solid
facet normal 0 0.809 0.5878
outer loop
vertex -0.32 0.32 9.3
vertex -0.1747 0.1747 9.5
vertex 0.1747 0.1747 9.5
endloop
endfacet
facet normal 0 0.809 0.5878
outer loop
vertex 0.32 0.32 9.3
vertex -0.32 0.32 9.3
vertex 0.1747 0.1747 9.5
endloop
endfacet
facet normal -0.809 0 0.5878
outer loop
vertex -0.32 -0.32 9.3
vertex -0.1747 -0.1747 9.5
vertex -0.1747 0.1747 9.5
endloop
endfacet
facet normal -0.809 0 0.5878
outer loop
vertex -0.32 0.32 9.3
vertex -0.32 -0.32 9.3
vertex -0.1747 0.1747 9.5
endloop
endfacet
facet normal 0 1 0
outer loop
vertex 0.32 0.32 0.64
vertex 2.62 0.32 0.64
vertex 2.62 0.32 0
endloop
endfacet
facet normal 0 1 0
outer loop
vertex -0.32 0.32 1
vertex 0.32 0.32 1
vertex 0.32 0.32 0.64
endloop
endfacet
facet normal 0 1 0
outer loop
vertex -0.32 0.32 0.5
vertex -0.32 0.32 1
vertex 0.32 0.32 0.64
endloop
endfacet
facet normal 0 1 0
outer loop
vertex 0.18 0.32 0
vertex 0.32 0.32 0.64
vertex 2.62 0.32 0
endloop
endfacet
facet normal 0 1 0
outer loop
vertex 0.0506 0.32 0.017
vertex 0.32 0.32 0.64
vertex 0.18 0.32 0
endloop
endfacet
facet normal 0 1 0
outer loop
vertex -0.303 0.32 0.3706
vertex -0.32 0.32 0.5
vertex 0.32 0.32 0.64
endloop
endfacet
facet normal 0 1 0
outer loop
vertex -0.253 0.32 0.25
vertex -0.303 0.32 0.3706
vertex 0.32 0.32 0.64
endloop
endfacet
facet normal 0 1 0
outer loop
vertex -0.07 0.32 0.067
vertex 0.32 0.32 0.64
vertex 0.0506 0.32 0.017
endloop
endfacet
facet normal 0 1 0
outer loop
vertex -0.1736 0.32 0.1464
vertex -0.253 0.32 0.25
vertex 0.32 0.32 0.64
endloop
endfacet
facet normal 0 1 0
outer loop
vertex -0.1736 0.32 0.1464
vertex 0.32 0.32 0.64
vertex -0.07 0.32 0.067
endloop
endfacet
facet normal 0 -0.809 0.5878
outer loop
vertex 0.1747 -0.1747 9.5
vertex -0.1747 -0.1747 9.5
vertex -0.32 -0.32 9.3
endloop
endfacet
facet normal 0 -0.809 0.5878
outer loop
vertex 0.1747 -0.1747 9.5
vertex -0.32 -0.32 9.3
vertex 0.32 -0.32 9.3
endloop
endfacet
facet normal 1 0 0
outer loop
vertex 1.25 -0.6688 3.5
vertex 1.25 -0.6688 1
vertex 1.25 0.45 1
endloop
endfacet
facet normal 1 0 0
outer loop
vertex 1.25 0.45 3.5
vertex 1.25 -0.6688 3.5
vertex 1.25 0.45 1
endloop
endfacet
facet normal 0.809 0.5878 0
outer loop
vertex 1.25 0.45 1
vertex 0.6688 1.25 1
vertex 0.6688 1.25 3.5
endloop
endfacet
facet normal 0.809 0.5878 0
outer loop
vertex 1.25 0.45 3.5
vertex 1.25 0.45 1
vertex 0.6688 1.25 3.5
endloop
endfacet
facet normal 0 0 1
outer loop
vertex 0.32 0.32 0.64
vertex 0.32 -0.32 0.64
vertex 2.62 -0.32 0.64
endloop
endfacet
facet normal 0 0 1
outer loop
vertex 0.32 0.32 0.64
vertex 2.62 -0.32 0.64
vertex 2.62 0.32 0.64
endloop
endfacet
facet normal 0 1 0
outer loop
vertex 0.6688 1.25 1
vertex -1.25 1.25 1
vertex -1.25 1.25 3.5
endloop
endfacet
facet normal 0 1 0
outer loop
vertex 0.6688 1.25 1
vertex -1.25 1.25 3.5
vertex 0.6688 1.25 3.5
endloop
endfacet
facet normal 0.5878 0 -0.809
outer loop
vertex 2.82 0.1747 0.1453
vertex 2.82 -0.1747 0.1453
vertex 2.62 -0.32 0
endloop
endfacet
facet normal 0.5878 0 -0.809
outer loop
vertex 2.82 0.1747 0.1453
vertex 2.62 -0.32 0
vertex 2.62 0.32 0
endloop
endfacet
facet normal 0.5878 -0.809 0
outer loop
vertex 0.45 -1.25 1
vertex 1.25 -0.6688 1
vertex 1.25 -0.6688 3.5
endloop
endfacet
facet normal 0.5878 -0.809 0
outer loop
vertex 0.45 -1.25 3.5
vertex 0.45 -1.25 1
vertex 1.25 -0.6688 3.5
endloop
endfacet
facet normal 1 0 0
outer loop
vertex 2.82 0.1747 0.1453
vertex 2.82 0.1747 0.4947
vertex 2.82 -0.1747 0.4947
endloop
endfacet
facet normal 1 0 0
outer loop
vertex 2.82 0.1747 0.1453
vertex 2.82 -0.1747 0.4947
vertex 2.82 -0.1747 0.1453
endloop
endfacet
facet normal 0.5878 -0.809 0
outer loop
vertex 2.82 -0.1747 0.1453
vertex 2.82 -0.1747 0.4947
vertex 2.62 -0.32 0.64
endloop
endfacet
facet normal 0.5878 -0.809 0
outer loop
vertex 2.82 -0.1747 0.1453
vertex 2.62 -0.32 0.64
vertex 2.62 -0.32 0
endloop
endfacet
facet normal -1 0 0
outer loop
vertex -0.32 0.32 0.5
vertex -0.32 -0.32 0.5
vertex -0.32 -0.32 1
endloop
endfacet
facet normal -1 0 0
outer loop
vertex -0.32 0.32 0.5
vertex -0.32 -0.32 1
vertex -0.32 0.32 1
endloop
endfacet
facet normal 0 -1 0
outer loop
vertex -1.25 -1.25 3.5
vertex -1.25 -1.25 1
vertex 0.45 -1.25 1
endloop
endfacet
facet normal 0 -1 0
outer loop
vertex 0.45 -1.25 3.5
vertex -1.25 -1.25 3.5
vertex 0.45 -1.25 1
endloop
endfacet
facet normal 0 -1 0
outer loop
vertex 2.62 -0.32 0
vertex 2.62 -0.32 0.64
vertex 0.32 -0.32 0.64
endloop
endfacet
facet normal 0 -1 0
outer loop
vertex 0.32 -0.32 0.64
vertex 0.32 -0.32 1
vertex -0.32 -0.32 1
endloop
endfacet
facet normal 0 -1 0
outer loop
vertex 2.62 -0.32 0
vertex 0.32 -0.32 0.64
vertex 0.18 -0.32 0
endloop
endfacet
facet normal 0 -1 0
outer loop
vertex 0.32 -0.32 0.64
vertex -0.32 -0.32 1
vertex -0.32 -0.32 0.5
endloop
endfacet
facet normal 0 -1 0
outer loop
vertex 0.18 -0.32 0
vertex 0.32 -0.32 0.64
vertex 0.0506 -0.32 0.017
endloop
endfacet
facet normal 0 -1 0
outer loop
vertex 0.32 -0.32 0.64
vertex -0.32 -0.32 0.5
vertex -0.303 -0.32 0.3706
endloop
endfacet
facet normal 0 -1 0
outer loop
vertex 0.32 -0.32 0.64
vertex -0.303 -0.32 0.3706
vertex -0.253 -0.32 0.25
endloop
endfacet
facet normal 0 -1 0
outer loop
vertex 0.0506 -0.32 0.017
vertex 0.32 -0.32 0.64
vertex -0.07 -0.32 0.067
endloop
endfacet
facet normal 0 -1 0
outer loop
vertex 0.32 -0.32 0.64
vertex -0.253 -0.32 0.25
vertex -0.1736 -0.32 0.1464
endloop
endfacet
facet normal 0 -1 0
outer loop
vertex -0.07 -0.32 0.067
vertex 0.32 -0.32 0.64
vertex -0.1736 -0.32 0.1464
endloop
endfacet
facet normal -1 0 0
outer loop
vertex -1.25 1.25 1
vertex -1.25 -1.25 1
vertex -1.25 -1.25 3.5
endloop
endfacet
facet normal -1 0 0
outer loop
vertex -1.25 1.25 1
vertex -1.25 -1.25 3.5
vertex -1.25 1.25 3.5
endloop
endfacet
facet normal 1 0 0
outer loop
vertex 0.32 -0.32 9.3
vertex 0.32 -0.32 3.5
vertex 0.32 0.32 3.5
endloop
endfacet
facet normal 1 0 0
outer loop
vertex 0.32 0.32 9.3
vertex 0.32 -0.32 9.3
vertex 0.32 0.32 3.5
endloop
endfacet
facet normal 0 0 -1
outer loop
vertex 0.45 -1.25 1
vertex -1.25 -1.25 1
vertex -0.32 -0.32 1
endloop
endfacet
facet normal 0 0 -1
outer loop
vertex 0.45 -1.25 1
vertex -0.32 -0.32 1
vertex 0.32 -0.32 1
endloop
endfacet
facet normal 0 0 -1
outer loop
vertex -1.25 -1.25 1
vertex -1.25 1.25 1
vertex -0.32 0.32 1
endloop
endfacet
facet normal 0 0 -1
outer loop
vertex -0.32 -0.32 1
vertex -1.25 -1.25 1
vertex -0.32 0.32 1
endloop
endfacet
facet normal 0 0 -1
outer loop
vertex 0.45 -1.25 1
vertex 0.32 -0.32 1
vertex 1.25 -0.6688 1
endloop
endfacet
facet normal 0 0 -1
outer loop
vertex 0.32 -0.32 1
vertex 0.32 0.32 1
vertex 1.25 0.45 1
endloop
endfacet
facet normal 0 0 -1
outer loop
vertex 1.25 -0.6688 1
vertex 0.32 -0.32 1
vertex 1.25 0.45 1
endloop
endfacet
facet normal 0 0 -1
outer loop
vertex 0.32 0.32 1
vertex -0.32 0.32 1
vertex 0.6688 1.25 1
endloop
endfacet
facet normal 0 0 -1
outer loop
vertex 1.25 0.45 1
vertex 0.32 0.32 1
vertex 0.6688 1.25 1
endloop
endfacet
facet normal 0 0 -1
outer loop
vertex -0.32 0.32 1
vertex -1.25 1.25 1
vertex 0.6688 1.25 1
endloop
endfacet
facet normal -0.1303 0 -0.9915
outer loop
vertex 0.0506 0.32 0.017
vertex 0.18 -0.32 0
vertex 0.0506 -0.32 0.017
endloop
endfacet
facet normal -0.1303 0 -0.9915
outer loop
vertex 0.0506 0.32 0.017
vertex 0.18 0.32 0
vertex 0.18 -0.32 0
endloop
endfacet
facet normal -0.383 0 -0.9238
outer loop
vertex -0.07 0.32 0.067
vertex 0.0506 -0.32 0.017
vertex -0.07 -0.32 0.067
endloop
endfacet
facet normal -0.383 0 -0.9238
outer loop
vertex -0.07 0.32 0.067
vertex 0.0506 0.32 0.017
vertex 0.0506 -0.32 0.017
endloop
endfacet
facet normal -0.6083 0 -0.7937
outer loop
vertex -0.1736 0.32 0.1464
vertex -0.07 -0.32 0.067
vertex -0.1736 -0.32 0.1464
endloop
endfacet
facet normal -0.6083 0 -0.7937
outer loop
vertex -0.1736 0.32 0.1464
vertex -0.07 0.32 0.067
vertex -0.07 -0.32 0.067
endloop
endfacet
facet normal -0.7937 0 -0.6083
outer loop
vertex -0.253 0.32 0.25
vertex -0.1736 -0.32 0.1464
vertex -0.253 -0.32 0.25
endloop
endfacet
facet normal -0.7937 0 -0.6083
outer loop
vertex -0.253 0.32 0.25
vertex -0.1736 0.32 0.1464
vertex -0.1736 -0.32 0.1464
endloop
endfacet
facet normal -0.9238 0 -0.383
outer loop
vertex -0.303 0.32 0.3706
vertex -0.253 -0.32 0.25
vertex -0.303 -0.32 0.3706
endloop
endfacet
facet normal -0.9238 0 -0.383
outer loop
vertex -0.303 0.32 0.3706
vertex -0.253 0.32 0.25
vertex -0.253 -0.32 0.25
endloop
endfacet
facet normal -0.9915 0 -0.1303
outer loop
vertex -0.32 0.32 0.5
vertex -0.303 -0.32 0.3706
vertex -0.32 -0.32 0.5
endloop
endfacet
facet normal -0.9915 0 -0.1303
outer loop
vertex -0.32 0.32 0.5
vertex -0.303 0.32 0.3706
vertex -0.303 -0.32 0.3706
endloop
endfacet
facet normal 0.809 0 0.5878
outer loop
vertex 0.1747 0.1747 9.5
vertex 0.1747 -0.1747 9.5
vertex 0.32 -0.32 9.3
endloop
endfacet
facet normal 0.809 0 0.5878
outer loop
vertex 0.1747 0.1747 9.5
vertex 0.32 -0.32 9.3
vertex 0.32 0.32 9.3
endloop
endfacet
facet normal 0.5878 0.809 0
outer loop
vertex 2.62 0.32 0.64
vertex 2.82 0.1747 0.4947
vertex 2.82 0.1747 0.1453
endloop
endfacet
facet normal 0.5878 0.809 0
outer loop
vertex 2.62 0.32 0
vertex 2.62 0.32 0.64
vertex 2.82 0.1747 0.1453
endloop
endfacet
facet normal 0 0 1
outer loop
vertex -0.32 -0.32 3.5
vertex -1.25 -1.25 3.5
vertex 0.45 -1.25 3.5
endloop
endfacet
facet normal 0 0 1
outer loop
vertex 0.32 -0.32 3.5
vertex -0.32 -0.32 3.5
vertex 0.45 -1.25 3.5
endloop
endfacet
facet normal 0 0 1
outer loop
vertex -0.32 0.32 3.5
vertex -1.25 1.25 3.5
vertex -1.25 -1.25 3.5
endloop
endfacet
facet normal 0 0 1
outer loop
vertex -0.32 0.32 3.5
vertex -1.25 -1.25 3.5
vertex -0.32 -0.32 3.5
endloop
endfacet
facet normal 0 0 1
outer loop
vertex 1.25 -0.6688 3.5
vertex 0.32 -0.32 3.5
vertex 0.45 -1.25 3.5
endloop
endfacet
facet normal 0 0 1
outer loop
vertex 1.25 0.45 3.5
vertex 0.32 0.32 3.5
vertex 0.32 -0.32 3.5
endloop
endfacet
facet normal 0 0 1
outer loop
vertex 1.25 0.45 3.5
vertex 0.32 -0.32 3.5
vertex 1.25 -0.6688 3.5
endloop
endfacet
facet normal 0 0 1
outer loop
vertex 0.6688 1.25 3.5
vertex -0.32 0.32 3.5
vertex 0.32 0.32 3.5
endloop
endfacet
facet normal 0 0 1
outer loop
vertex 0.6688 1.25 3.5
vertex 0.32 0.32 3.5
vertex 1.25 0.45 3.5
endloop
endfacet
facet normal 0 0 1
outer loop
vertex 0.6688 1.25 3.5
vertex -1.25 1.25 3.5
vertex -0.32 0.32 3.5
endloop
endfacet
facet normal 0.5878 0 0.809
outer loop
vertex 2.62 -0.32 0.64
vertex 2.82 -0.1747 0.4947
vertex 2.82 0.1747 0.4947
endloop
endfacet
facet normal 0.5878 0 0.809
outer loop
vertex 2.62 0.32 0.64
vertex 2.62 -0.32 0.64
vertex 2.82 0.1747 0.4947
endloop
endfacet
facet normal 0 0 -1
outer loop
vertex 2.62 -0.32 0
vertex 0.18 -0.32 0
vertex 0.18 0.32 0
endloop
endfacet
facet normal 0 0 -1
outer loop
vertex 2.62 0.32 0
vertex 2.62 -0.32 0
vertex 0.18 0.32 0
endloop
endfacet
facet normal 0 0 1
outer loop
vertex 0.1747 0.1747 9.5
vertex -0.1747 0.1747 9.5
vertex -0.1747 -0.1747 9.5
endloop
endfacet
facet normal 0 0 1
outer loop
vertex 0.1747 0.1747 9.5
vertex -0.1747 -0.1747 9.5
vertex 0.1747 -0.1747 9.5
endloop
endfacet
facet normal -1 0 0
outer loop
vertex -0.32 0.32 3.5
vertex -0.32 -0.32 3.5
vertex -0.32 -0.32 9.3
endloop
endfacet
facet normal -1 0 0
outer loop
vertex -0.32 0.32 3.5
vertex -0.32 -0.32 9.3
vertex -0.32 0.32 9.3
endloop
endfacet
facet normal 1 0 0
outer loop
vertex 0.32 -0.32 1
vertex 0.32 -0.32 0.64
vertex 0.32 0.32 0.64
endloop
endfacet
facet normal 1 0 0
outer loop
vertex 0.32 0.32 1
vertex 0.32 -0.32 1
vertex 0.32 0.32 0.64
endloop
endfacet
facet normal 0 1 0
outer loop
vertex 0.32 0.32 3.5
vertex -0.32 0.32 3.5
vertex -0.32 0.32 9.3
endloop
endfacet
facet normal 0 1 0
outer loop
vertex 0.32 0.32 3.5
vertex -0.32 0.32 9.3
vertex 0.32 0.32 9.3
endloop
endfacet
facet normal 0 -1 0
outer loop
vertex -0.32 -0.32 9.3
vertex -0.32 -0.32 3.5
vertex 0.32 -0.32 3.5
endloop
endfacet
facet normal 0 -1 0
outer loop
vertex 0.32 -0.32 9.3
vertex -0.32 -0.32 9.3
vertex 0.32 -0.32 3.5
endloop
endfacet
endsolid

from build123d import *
from OCP.BRepFilletAPI import BRepFilletAPI_MakeChamfer

# Parameters (mm, degrees)
SKETCH_1_W           = 2.5
SKETCH_1_H           = 2.5
EXTRUDE_1_DEPTH      = 2.5
EXTRUDE_2_DEPTH      = 6
EXTRUDE_2_DEPTH_BACK = 3.5
SKETCH_2_W           = 0.64
SKETCH_2_H           = 0.64
SKETCH_4_W           = 0.64
SKETCH_4_H           = 0.64
EXTRUDE_4_DEPTH      = 2.5
FILLET_1_R           = 0.5
CHAMFER_1_SIZE       = 0.2
CHAMFER_1_SIZE2      = 0.145308506
CHAMFER_2_SIZE       = 0.8
CHAMFER_2_SIZE2      = 0.581234022


with BuildPart() as part:
    # Эскиз1 → Бобышка-Вытянуть1 (new body)
    with BuildSketch(Plane.XY.offset(1)):
        Rectangle(SKETCH_1_W, SKETCH_1_H)
    extrude(amount=EXTRUDE_1_DEPTH)

    # Эскиз2 → Бобышка-Вытянуть2 (add, two sides: drawn at the far end of the back side and taken through both)
    with BuildSketch(Plane.XY.offset(3.5).offset(-EXTRUDE_2_DEPTH_BACK)):
        Rectangle(SKETCH_2_W, SKETCH_2_H)
    extrude(amount=EXTRUDE_2_DEPTH + EXTRUDE_2_DEPTH_BACK)

    # Эскиз4 → Бобышка-Вытянуть4 (add)
    with BuildSketch(Plane(origin=(0.32, 0, 0), x_dir=(0, 0, -1), z_dir=(1, 0, 0))):
        with Locations((-0.32, 0)):
            Rectangle(SKETCH_4_W, SKETCH_4_H)
    extrude(amount=EXTRUDE_4_DEPTH)

    # Скругление1
    fillet_1_edges = [part.edges().sort_by_distance(p)[0] for p in [
        (-0.32, 0, 0),
    ]]
    fillet(fillet_1_edges, radius=FILLET_1_R)

    # Фаска1: one chamfer whose edges measure the first distance from different faces: ONE call of the kernel's chamfer builder (chamfer() names one face for all edges)
    chamfer_1_edges_1 = [part.edges().sort_by_distance(p)[0] for p in [
        (0.32, 0, 9.5),
    ]]
    chamfer_1_side_1 = [part.faces().sort_by_distance(p)[0] for p in [
        (0.32, 0, 6.5),
    ]]
    chamfer_1_edges_2 = [part.edges().sort_by_distance(p)[0] for p in [
        (0, 0.32, 9.5),
    ]]
    chamfer_1_side_2 = [part.faces().sort_by_distance(p)[0] for p in [
        (0, 0.32, 6.5),
    ]]
    chamfer_1_edges_3 = [part.edges().sort_by_distance(p)[0] for p in [
        (-0.32, 0, 9.5),
    ]]
    chamfer_1_side_3 = [part.faces().sort_by_distance(p)[0] for p in [
        (-0.32, 0, 6.5),
    ]]
    chamfer_1_edges_4 = [part.edges().sort_by_distance(p)[0] for p in [
        (0, -0.32, 9.5),
    ]]
    chamfer_1_side_4 = [part.faces().sort_by_distance(p)[0] for p in [
        (0, -0.32, 6.5),
    ]]
    chamfer_1_edges_5 = [part.edges().sort_by_distance(p)[0] for p in [
        (2.82, 0, 0),
    ]]
    chamfer_1_side_5 = [part.faces().sort_by_distance(p)[0] for p in [
        (1.5, 0, 0),
    ]]
    chamfer_1_edges_6 = [part.edges().sort_by_distance(p)[0] for p in [
        (2.82, 0.32, 0.32),
    ]]
    chamfer_1_side_6 = [part.faces().sort_by_distance(p)[0] for p in [
        (1.154058948, 0.32, 0.3778024),
    ]]
    chamfer_1_edges_7 = [part.edges().sort_by_distance(p)[0] for p in [
        (2.82, 0, 0.64),
    ]]
    chamfer_1_side_7 = [part.faces().sort_by_distance(p)[0] for p in [
        (1.57, 0, 0.64),
    ]]
    chamfer_1_edges_8 = [part.edges().sort_by_distance(p)[0] for p in [
        (2.82, -0.32, 0.32),
    ]]
    chamfer_1_side_8 = [part.faces().sort_by_distance(p)[0] for p in [
        (1.154058948, -0.32, 0.3778024),
    ]]
    chamfer_1 = BRepFilletAPI_MakeChamfer(part.part.solid().wrapped)
    for e in chamfer_1_edges_1:
        chamfer_1.Add(CHAMFER_1_SIZE, CHAMFER_1_SIZE2, e.wrapped, chamfer_1_side_1[0].wrapped)  # the first distance lies on this face
    for e in chamfer_1_edges_2:
        chamfer_1.Add(CHAMFER_1_SIZE, CHAMFER_1_SIZE2, e.wrapped, chamfer_1_side_2[0].wrapped)  # the first distance lies on this face
    for e in chamfer_1_edges_3:
        chamfer_1.Add(CHAMFER_1_SIZE, CHAMFER_1_SIZE2, e.wrapped, chamfer_1_side_3[0].wrapped)  # the first distance lies on this face
    for e in chamfer_1_edges_4:
        chamfer_1.Add(CHAMFER_1_SIZE, CHAMFER_1_SIZE2, e.wrapped, chamfer_1_side_4[0].wrapped)  # the first distance lies on this face
    for e in chamfer_1_edges_5:
        chamfer_1.Add(CHAMFER_1_SIZE, CHAMFER_1_SIZE2, e.wrapped, chamfer_1_side_5[0].wrapped)  # the first distance lies on this face
    for e in chamfer_1_edges_6:
        chamfer_1.Add(CHAMFER_1_SIZE, CHAMFER_1_SIZE2, e.wrapped, chamfer_1_side_6[0].wrapped)  # the first distance lies on this face
    for e in chamfer_1_edges_7:
        chamfer_1.Add(CHAMFER_1_SIZE, CHAMFER_1_SIZE2, e.wrapped, chamfer_1_side_7[0].wrapped)  # the first distance lies on this face
    for e in chamfer_1_edges_8:
        chamfer_1.Add(CHAMFER_1_SIZE, CHAMFER_1_SIZE2, e.wrapped, chamfer_1_side_8[0].wrapped)  # the first distance lies on this face
    add(Compound.cast(chamfer_1.Shape()), mode=Mode.REPLACE)

    # Фаска2: one chamfer whose edges measure the first distance from different faces: ONE call of the kernel's chamfer builder (chamfer() names one face for all edges)
    chamfer_2_edges_1 = [part.edges().sort_by_distance(p)[0] for p in [
        (1.25, -1.25, 2.25),
    ]]
    chamfer_2_side_1 = [part.faces().sort_by_distance(p)[0] for p in [
        (0, -1.25, 2.25),
    ]]
    chamfer_2_edges_2 = [part.edges().sort_by_distance(p)[0] for p in [
        (1.25, 1.25, 2.25),
    ]]
    chamfer_2_side_2 = [part.faces().sort_by_distance(p)[0] for p in [
        (1.25, 0, 2.25),
    ]]
    chamfer_2 = BRepFilletAPI_MakeChamfer(part.part.solid().wrapped)
    for e in chamfer_2_edges_1:
        chamfer_2.Add(CHAMFER_2_SIZE, CHAMFER_2_SIZE2, e.wrapped, chamfer_2_side_1[0].wrapped)  # the first distance lies on this face
    for e in chamfer_2_edges_2:
        chamfer_2.Add(CHAMFER_2_SIZE, CHAMFER_2_SIZE2, e.wrapped, chamfer_2_side_2[0].wrapped)  # the first distance lies on this face
    add(Compound.cast(chamfer_2.Shape()), mode=Mode.REPLACE)


solid = part.part
